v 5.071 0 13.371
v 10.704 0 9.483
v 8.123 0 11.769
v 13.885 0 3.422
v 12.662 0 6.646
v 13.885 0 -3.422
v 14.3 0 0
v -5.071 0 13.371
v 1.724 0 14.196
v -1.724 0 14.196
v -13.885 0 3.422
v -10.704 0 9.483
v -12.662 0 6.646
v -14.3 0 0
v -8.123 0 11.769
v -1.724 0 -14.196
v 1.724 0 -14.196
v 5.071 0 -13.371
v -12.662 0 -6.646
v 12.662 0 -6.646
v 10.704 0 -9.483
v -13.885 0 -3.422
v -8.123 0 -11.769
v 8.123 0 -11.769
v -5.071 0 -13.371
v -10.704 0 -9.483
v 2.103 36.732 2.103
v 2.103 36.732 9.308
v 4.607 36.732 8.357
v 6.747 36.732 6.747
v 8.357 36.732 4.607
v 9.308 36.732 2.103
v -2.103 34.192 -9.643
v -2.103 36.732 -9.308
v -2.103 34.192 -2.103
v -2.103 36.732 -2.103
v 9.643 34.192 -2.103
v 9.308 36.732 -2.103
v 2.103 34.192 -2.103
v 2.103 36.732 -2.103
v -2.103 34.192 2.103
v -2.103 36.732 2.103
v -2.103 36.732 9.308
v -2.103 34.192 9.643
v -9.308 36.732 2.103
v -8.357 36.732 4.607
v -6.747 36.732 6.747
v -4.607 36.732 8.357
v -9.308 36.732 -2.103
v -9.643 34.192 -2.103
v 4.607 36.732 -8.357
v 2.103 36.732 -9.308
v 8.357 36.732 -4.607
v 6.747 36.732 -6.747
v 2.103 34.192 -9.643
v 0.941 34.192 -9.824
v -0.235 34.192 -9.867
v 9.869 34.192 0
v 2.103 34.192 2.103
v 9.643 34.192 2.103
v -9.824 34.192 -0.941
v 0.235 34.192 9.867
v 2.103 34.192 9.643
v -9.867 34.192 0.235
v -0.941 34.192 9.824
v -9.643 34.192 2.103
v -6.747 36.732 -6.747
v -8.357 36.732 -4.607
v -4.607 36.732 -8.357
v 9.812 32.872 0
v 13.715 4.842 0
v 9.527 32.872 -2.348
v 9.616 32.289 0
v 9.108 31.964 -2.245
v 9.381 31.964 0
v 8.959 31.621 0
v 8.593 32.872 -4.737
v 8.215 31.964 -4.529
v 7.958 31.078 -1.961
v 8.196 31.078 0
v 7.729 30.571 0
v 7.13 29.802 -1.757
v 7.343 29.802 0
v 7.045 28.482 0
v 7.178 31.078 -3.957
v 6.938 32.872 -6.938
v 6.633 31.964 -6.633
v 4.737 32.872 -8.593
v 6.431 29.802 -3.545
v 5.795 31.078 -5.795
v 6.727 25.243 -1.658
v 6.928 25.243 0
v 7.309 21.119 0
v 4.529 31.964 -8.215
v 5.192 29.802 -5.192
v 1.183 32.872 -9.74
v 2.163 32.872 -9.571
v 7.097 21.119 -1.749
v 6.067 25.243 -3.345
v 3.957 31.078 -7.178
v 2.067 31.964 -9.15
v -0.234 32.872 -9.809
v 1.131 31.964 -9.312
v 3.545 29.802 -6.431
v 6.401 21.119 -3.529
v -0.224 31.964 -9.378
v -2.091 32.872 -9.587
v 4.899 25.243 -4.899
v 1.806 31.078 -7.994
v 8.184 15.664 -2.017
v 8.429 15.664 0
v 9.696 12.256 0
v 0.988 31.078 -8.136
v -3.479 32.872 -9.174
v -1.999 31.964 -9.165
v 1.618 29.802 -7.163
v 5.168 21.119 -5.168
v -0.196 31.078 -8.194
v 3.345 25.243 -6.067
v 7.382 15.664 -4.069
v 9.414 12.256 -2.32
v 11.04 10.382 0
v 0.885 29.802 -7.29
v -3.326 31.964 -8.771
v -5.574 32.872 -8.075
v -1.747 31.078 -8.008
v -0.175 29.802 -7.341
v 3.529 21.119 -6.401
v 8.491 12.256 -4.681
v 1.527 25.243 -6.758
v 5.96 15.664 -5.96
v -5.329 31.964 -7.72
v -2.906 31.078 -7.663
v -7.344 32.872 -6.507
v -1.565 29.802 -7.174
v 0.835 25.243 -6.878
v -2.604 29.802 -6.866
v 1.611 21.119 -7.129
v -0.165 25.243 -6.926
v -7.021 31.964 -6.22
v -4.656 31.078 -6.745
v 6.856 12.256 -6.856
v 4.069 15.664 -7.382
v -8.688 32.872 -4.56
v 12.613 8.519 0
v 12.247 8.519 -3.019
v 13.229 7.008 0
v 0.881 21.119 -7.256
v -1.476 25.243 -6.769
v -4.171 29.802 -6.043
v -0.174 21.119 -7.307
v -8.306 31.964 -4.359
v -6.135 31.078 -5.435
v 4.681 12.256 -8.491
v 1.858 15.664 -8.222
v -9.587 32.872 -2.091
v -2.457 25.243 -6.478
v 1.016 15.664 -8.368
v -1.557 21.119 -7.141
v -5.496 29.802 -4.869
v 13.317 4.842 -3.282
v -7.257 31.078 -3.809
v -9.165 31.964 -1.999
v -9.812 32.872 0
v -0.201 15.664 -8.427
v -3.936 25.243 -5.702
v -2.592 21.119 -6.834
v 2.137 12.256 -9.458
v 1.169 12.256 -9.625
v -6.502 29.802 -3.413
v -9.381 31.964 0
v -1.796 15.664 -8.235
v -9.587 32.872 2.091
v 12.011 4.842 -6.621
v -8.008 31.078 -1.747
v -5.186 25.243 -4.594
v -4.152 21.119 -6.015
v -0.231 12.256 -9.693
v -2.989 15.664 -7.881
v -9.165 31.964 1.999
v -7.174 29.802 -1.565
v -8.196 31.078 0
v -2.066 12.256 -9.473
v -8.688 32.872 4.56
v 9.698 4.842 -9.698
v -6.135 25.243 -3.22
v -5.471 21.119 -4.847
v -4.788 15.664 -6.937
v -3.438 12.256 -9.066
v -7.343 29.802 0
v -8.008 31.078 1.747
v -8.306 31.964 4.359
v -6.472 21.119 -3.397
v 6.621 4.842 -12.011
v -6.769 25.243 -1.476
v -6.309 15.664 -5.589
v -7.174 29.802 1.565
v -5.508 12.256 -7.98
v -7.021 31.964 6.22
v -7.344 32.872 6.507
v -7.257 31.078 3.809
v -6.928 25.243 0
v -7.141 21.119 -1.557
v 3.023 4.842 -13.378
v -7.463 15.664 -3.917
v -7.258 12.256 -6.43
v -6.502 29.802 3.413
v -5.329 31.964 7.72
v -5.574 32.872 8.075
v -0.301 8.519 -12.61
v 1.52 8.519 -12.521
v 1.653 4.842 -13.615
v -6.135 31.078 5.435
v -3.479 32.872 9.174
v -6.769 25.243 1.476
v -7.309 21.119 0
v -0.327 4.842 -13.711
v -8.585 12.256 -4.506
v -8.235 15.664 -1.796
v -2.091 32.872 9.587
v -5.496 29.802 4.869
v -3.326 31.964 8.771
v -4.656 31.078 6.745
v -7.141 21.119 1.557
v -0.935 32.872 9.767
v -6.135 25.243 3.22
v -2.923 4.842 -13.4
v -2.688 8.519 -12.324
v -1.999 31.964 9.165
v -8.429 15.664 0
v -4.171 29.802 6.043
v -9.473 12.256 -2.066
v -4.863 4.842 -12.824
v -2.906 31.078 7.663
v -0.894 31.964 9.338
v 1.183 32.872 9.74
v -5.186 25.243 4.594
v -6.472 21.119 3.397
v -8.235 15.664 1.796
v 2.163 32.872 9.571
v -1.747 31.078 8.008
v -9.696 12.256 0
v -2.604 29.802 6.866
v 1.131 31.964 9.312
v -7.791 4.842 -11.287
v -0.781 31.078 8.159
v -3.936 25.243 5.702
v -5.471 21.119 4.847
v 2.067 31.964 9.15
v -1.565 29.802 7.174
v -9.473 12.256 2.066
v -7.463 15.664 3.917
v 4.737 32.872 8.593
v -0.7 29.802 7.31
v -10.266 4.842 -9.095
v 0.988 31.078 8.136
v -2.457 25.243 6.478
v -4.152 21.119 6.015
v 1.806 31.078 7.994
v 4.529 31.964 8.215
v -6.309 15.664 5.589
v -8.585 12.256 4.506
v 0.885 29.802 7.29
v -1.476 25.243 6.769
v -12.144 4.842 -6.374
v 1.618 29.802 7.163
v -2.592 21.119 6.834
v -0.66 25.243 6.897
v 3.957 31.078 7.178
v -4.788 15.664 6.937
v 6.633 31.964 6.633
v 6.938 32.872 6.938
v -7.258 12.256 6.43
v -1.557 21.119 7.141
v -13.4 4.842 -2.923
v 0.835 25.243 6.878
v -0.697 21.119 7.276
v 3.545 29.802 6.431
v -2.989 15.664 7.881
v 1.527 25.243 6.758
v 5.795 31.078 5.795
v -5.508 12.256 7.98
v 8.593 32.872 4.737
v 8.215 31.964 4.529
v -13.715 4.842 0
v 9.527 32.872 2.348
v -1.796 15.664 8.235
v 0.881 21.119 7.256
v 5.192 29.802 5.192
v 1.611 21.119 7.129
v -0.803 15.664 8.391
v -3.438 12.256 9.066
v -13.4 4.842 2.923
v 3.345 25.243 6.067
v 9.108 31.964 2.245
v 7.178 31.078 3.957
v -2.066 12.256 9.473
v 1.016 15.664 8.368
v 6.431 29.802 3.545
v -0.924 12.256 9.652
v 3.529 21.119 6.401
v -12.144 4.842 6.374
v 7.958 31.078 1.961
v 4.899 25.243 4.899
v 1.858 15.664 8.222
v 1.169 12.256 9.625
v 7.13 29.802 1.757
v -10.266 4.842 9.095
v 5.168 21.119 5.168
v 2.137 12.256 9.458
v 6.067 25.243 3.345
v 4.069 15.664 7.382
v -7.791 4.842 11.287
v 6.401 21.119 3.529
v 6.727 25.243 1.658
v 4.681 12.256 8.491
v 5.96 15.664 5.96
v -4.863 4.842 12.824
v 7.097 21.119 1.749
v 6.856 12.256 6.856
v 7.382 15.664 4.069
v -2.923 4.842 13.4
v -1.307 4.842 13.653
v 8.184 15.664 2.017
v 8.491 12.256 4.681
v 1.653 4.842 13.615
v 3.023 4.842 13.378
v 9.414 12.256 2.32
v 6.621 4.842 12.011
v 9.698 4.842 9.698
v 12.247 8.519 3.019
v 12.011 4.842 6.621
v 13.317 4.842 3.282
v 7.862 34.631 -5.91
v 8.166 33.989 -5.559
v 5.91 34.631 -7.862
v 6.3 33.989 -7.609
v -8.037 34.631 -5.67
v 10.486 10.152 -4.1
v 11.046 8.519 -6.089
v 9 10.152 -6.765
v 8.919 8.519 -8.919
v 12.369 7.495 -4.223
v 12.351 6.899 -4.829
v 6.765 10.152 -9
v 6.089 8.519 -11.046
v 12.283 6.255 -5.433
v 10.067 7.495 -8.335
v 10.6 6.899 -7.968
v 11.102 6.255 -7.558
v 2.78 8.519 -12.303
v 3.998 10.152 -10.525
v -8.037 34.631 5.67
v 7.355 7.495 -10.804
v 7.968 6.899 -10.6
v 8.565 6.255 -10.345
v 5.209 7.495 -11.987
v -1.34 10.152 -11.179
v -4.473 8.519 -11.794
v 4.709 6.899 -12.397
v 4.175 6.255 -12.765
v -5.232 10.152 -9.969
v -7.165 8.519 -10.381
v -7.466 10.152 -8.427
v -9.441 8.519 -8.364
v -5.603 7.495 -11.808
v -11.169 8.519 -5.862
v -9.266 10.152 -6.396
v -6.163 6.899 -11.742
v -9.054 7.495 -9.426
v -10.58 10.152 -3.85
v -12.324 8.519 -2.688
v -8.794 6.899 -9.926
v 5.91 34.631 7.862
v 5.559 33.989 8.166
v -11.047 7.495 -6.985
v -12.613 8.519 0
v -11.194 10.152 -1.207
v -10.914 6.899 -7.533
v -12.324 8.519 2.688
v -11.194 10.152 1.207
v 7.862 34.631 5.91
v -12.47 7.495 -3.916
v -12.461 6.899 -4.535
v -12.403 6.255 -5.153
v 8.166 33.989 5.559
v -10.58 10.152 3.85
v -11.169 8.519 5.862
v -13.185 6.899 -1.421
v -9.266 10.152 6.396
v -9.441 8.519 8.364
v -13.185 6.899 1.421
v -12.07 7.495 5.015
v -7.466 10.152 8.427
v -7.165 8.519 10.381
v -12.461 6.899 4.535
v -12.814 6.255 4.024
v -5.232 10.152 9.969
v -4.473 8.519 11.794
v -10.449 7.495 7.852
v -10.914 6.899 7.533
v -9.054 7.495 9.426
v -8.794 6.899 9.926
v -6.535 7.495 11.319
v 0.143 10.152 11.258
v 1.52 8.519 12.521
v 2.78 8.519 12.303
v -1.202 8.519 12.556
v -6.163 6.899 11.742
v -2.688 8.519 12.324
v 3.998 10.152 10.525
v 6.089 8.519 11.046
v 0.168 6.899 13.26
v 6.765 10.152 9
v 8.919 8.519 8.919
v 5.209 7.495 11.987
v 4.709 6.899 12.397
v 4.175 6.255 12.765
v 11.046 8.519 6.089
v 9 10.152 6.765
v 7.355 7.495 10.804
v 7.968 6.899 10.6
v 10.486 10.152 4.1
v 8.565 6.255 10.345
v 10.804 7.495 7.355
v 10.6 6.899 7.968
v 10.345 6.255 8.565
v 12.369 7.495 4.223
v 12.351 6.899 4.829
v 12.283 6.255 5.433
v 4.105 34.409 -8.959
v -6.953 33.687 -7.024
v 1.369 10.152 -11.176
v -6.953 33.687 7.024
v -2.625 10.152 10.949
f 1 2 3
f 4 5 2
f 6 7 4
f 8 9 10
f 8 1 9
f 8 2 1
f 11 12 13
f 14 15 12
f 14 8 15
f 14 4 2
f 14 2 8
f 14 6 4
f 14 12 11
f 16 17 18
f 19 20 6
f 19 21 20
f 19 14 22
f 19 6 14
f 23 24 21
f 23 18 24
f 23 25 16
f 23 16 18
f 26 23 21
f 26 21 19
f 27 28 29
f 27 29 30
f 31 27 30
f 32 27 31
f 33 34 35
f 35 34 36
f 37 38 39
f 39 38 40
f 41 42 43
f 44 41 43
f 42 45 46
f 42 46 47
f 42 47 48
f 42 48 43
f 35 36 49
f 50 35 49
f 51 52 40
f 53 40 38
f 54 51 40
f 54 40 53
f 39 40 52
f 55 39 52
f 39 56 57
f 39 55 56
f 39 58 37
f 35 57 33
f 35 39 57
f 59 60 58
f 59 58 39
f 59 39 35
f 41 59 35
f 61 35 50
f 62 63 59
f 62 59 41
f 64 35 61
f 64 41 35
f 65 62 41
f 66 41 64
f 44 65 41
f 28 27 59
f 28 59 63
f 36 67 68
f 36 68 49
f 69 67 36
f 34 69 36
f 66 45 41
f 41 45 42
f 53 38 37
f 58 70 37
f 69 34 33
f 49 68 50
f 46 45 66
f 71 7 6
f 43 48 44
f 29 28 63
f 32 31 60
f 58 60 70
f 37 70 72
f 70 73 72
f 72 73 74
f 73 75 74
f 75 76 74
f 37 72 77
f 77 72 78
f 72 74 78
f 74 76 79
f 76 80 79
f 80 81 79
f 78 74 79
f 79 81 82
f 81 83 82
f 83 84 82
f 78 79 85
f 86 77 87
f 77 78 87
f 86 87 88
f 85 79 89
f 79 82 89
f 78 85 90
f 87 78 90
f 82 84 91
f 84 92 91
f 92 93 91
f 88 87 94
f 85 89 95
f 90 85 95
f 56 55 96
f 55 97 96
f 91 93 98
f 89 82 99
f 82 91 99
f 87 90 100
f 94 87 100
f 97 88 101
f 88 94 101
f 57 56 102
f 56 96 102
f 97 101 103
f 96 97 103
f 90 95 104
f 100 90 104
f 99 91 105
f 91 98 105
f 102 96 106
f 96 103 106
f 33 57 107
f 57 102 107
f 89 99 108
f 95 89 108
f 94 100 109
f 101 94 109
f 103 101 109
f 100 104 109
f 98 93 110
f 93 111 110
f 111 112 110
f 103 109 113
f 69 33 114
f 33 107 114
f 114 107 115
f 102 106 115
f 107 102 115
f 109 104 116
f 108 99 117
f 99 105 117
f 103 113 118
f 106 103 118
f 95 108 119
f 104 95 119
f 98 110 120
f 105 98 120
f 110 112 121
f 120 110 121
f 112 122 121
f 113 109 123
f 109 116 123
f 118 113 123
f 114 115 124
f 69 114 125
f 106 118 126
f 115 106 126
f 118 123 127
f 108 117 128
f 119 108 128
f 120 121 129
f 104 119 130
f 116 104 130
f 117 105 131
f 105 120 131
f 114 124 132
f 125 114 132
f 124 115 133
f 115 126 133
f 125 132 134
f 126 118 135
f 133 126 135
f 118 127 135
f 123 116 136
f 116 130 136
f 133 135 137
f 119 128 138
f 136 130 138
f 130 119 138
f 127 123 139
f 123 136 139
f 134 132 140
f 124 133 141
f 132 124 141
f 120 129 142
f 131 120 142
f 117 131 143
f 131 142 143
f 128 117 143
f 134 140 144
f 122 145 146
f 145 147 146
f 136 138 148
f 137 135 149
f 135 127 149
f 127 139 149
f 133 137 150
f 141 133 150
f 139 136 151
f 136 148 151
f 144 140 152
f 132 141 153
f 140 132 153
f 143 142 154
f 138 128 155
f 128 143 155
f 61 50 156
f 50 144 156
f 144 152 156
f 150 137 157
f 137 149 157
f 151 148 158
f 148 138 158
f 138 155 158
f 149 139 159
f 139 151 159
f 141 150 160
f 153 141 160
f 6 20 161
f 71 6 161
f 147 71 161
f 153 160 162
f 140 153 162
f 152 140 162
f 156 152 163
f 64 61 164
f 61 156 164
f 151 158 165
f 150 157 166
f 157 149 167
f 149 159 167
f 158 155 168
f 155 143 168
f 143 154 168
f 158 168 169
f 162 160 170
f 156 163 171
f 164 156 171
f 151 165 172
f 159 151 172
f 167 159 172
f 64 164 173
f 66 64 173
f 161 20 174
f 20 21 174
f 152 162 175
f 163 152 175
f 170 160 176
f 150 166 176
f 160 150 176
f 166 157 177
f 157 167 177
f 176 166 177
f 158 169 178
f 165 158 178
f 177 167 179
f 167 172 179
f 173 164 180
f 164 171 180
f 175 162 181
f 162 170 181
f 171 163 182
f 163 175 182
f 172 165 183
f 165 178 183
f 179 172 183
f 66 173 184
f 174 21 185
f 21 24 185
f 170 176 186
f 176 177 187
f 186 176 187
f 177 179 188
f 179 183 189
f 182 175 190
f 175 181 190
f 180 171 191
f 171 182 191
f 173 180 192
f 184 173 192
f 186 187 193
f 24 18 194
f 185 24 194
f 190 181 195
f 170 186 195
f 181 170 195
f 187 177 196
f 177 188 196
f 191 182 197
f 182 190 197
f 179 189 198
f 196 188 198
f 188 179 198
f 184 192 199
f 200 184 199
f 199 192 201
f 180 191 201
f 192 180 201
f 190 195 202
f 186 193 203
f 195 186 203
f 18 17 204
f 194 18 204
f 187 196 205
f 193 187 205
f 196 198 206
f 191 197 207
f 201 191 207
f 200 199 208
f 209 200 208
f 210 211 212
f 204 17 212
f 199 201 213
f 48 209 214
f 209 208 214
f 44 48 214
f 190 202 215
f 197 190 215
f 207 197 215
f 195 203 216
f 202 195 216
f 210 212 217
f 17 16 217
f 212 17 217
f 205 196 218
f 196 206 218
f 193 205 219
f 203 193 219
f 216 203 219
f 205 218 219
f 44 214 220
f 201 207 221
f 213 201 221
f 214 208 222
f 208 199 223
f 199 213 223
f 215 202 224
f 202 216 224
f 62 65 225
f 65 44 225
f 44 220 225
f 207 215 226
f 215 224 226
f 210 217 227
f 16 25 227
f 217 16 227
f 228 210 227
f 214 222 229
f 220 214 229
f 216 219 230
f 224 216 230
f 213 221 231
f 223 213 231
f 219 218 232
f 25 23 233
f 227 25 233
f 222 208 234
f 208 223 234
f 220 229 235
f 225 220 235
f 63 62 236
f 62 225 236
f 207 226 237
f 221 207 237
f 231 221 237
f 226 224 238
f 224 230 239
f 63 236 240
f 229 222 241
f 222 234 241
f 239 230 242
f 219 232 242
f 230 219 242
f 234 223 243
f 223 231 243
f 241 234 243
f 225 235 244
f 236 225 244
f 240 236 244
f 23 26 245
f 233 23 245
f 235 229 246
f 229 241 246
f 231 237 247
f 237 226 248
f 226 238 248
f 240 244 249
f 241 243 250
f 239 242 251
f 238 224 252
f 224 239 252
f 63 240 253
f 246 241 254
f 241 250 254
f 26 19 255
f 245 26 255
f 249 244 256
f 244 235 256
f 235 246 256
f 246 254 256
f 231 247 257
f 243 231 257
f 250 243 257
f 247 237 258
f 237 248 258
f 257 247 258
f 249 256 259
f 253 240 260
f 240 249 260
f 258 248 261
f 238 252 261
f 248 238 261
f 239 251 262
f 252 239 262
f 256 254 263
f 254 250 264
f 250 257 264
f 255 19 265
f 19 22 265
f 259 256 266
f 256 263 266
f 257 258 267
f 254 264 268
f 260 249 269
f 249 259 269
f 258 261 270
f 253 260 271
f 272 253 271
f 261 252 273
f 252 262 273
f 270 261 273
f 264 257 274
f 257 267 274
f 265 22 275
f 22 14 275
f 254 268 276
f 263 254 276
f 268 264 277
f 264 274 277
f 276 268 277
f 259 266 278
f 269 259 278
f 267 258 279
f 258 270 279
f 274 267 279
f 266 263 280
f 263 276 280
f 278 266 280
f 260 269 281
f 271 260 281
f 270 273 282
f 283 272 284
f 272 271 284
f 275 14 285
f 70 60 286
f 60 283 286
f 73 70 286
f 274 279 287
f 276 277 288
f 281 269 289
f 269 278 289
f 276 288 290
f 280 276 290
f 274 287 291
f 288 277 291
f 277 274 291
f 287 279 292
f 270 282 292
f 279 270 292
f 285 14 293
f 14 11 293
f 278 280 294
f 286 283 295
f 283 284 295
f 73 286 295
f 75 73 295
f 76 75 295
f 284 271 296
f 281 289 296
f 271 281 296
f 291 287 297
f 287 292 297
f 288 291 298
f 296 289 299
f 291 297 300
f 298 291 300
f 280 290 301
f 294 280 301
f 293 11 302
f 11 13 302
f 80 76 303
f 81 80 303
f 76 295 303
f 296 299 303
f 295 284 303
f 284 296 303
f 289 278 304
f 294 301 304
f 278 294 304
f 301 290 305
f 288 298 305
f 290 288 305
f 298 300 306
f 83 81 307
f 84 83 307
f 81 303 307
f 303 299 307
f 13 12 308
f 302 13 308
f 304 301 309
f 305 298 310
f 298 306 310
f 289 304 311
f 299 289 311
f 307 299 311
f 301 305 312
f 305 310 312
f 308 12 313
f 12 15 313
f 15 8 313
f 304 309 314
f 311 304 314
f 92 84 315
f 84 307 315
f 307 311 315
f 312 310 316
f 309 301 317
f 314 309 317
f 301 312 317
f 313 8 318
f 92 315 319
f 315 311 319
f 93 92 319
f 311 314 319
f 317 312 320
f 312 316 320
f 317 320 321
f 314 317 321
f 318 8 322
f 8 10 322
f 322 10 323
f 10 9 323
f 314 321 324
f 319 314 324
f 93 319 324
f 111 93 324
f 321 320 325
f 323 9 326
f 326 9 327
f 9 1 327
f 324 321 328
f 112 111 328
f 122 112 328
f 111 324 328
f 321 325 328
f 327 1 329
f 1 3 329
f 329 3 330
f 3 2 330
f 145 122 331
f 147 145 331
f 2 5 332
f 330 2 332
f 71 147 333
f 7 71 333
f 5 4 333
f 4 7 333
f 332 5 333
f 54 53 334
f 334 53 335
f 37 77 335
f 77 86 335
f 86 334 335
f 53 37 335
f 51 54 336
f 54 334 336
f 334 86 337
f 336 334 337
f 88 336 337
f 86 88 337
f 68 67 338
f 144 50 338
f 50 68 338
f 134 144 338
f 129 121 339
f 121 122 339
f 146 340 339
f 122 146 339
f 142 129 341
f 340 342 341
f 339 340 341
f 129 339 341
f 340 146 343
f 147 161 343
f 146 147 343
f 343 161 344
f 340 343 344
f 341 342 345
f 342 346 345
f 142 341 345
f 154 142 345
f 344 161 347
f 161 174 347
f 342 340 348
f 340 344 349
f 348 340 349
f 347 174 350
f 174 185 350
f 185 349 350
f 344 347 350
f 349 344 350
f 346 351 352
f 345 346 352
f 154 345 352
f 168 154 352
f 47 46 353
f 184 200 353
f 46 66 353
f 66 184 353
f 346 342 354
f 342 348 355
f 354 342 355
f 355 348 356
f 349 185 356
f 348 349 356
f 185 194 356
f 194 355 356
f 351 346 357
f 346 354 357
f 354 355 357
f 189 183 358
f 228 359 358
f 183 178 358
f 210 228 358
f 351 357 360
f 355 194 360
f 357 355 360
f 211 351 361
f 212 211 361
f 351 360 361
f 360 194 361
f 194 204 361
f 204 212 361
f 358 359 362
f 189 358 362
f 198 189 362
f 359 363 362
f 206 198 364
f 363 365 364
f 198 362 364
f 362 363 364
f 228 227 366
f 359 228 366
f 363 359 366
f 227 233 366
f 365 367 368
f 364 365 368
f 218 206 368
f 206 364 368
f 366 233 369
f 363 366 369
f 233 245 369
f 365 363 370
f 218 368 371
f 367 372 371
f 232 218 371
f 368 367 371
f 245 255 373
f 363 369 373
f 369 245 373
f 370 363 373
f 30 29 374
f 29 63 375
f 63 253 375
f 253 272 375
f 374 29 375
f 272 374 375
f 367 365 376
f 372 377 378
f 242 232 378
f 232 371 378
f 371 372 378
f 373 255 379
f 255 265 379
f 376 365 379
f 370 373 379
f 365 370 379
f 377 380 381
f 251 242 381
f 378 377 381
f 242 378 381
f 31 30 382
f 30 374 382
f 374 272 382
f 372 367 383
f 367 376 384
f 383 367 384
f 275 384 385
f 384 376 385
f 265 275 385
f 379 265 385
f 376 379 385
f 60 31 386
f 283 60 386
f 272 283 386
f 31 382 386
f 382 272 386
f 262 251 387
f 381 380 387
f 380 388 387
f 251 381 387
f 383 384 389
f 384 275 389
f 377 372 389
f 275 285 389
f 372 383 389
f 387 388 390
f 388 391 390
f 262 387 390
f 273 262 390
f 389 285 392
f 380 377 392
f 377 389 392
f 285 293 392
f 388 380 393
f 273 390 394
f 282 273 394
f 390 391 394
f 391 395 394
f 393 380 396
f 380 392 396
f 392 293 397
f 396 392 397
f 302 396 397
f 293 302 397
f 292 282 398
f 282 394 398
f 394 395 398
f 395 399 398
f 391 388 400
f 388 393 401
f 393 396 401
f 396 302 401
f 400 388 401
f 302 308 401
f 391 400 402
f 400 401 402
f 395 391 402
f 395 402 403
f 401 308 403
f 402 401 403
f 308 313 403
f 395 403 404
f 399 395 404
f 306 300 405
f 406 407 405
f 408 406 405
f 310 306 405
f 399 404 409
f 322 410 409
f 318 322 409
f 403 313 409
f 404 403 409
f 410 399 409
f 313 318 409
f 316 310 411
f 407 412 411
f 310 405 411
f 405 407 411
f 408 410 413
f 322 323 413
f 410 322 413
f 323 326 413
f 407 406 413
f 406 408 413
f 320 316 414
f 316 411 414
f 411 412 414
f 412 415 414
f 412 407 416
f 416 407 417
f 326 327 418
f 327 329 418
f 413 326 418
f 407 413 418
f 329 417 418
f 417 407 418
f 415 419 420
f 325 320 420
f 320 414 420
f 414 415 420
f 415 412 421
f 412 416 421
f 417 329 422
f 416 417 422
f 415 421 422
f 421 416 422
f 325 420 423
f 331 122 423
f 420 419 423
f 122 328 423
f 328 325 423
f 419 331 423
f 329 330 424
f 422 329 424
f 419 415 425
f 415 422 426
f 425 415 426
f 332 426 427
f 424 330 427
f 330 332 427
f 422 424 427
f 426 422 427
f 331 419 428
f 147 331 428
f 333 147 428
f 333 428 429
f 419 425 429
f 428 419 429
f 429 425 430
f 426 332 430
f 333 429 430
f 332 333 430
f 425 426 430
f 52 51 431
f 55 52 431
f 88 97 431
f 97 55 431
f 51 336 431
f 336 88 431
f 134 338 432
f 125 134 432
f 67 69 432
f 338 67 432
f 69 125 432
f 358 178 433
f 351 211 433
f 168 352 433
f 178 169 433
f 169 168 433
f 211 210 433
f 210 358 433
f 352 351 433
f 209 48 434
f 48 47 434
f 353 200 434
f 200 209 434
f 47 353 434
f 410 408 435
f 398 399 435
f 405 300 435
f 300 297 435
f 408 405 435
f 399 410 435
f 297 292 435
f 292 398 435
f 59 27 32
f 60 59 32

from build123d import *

# Parameters (mm, degrees)
F2_W     = 4.20624
F2_H     = 20.0195648662
F2_H_2   = 4.20624
F2_W_2   = 17.6414342363
F3_DEPTH = 2.54


with BuildPart() as f1:
    # F0 (on Top) → F1 (revolve)
    with BuildSketch(Plane.XY):
        with BuildLine():
            Line((0, 36.7317478065), (0, 0))
            Line((0, 0), (14.3002, 0))
            add(Edge.make_bspline(
                [(9.5422007305, 36.7317478065), (9.8377349923, 34.8905601939), (10.3712029618, 31.5670382058), (5.4519131165, 31.1307695275), (8.3582832439, 11.1967644856), (13.374842383, 9.3400085371), (13.964740637, 3.3859269715), (14.3002, 0)],
                knots=[0, 0, 0, 0, 0.1612494868, 0.2910709431, 0.6079020726, 0.7770243936, 1, 1, 1, 1], degree=3))
            Line((9.5422007305, 36.7317478065), (0, 36.7317478065))
        make_face()
    revolve(axis=Axis((0, 18.3658739032, 0), (0, 1, 0)))

    # F2 (on face) → F3 (cut)
    with BuildSketch(Plane(origin=(0, 36.7317478065, 0), x_dir=(-1, 0, 0), z_dir=(0, 1, 0))):
        with Locations((0, -12.1129024331)):
            Rectangle(F2_W, F2_H)
        Rectangle(F2_W, F2_H_2)
        with Locations((10.9238371181, 0)):
            Rectangle(F2_W_2, F2_H_2)
        with Locations((-10.9238371181, 0)):
            Rectangle(F2_W_2, F2_H_2)
        with Locations((0, 12.1129024331)):
            Rectangle(F2_W, F2_H)
    extrude(amount=-F3_DEPTH, mode=Mode.SUBTRACT)


solid = f1.part
